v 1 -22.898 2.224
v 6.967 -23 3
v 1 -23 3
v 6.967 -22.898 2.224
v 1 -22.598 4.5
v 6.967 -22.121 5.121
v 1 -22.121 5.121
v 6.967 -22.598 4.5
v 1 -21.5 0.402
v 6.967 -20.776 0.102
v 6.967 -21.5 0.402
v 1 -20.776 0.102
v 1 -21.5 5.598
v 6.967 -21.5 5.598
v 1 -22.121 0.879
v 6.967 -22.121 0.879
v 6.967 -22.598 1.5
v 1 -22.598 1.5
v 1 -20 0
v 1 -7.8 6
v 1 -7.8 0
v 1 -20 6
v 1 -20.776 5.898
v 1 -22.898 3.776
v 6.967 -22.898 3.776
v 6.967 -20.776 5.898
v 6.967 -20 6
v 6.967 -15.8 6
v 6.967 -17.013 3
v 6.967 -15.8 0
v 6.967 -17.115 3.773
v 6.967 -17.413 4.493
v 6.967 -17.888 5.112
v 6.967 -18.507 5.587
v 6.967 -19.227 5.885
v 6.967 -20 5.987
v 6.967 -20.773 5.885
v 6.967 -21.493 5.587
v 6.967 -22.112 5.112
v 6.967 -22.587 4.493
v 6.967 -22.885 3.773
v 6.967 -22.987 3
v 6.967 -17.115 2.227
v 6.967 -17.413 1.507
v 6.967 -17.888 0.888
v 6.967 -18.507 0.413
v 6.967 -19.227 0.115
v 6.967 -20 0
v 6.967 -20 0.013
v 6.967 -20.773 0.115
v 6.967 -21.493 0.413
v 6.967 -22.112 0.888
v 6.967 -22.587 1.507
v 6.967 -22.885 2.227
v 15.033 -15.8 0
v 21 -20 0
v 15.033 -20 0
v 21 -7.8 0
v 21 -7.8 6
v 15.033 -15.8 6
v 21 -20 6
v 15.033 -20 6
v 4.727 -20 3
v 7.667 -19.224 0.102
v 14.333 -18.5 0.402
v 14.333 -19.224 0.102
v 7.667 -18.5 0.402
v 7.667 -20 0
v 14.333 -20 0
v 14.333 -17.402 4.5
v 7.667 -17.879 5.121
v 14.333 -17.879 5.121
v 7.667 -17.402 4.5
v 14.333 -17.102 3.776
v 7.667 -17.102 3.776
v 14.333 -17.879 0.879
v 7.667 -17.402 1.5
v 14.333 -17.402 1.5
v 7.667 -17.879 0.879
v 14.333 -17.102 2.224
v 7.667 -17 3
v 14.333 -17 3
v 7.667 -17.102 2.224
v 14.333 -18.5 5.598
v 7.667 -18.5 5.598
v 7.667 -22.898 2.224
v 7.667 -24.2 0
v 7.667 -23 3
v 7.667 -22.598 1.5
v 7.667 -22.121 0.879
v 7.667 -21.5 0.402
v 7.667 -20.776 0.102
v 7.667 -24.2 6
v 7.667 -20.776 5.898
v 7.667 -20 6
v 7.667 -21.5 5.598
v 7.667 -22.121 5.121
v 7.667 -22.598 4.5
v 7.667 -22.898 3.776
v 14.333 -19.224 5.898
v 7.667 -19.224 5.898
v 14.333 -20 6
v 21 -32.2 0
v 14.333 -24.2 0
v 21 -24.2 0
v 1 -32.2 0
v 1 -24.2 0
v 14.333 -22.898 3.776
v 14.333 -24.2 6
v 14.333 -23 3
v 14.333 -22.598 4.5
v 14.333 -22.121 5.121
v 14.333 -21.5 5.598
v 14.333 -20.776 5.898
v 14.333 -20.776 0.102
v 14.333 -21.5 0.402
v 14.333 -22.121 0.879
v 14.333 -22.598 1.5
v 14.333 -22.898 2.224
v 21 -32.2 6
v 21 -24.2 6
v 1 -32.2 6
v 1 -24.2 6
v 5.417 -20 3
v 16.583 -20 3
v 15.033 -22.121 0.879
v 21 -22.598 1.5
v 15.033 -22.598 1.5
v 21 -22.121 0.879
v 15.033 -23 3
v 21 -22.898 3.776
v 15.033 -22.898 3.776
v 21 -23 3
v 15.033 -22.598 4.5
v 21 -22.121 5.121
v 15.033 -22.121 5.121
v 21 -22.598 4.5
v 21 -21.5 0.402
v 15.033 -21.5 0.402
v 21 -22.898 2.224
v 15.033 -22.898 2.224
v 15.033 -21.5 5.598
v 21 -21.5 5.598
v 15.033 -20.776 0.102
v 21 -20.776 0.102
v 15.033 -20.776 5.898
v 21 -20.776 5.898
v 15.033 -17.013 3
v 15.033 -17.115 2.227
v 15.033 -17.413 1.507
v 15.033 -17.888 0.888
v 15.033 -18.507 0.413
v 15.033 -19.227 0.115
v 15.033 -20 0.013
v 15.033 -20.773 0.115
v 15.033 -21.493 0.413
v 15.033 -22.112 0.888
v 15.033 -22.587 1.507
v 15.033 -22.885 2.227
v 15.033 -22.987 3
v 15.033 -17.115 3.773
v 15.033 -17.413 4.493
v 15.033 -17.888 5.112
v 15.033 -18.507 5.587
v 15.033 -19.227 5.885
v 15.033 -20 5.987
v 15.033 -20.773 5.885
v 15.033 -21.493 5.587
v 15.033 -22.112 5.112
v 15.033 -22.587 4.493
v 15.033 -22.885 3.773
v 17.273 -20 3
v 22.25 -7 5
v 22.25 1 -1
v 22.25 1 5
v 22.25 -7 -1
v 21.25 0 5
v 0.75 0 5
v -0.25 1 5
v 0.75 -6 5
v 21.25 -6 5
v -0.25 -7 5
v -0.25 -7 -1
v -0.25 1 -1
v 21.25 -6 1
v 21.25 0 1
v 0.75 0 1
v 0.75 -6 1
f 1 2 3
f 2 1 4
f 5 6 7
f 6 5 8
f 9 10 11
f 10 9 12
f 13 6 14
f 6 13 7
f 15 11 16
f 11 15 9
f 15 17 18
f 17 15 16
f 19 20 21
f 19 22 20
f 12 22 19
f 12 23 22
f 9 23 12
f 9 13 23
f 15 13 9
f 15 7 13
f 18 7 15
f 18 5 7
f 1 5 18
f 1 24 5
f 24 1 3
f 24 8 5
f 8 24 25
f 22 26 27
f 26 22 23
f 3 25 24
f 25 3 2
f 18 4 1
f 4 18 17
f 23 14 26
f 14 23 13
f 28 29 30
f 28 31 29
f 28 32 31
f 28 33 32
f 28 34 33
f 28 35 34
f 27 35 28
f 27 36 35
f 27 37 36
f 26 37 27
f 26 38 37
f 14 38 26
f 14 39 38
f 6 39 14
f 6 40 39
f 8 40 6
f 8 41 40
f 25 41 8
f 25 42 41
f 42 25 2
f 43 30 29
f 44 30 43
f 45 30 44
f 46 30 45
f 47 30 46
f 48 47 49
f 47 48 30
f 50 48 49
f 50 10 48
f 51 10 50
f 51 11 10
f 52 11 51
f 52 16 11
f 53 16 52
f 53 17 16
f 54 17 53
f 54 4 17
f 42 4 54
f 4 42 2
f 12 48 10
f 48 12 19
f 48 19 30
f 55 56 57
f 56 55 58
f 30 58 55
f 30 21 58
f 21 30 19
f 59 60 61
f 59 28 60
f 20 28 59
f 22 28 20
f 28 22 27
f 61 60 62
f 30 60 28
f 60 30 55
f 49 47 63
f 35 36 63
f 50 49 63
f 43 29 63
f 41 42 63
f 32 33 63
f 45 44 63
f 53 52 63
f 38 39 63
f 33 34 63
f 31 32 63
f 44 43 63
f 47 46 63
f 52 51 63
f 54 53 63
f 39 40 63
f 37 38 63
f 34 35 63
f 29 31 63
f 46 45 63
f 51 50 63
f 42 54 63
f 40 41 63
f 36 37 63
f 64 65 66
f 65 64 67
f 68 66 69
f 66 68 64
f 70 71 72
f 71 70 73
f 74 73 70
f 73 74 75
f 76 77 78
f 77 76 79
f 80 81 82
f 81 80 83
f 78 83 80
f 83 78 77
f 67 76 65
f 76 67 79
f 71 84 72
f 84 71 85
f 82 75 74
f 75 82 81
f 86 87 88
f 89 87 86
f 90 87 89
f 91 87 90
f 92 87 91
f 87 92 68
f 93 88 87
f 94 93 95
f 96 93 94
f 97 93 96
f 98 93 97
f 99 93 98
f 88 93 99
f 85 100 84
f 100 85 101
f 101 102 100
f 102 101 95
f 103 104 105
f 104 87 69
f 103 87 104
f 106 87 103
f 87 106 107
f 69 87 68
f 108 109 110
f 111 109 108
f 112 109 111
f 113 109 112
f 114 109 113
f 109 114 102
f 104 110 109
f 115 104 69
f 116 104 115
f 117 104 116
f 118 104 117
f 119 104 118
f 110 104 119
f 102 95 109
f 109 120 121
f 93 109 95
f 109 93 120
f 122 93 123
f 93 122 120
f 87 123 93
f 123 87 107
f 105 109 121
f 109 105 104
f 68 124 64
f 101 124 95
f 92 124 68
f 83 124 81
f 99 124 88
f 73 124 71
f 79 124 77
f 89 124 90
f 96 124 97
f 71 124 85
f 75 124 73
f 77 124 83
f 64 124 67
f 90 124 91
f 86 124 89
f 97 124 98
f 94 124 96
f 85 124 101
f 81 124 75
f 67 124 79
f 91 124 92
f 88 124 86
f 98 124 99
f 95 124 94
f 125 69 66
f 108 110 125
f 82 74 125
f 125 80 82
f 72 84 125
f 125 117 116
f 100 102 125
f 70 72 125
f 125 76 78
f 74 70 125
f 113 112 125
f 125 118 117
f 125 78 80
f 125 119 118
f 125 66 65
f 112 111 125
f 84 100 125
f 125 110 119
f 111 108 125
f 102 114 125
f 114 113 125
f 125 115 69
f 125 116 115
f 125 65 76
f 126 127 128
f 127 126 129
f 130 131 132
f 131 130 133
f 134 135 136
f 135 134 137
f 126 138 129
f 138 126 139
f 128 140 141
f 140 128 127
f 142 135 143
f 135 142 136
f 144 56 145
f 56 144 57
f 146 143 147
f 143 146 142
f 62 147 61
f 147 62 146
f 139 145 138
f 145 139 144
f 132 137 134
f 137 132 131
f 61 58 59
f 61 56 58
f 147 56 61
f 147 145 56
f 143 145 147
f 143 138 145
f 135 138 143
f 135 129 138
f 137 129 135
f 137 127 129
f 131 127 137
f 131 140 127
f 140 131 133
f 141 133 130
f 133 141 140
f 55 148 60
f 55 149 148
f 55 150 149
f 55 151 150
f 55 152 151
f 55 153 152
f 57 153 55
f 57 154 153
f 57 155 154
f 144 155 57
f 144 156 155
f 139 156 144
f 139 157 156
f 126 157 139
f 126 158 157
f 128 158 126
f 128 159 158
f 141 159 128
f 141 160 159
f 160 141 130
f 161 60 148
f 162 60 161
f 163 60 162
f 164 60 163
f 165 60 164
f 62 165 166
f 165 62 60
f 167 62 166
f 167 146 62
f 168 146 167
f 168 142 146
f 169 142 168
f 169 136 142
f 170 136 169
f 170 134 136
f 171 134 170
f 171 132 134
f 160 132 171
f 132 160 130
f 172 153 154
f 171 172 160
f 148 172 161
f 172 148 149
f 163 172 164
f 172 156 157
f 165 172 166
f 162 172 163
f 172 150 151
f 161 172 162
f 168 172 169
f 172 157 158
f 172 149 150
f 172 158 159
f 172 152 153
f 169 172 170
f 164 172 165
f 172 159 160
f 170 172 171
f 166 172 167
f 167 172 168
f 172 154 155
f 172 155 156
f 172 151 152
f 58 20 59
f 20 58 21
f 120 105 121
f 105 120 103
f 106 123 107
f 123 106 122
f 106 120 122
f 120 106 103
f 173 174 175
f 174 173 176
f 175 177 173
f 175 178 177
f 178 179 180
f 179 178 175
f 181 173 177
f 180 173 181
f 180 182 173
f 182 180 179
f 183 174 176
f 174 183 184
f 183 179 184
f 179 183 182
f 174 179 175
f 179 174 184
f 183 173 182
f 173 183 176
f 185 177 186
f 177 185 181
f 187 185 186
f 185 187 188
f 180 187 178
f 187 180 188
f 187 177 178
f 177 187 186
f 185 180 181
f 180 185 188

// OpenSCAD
// file: mathhinge.scad
module math_hinge(){// mathgrrl cone hinge

//////////////////////////////////////////////////////
// parameters

// Length of the complete hinge
length = 20;

// Height (diameter) of the hinge
height = 3;

// Clearance between cones and holes
clearance = .7;		

// Clearance between hinge and sides
gap = .6; 				

// Parameters that the user does not get to specify
$fn=24*1;
border = 2*1; 
fudge = .01*1;			// to preserve mesh integrity
corner = 0*1;      	// space between hinge and corner
hinge_radius = height/2;
cone_height = 1.5*hinge_radius;  

//////////////////////////////////////////////////////
// renders

rotate(90,[0,1,0]) 
	translate([-hinge_radius,0,0])
		hinge();

translate([0,hinge_radius+gap,0]) bar();
translate([0,-2*border-hinge_radius-gap,0]) bar();

//translate([0,hinge_radius+gap,0]) square();
//translate([0,-length-hinge_radius-gap,0]) square();


//////////////////////////////////////////////////////
// module for hinge

module hinge(){
	rad = hinge_radius;
	clr = clearance;
	len = (length-2*corner)/3; 
	con = cone_height;
	// left outside hinge = (cylinder+box)-cone
	difference(){
		union(){
			translate([0,0,corner]) cylinder(h=len-clr,r=rad);
			translate([-rad,0,corner]) cube([2*rad,rad+gap,len-clr]);
		}
		translate([0,0,corner+len-con-clr+fudge]) cylinder(h=con,r1=0,r2=rad);
	}
	// inside hinge = cylinder+box+cone+cone
	union(){
		translate([0,0,corner+len]) cylinder(h=len,r=rad);
		translate([-rad,-rad-gap,corner+len]) cube([2*rad,rad+gap,len]);
		translate([0,0,corner+len-con]) cylinder(h=con,r1=0,r2=rad);
		translate([0,0,corner+2*len]) cylinder(h=con,r1=rad,r2=0);
	}
	// right outside hinge = (cylinder+box)-cone
	difference(){
		union(){
			translate([0,0,corner+2*len+clr]) cylinder(h=len-clr,r=rad);
			translate([-rad,0,corner+2*len+clr]) cube([2*rad,rad+gap,len-clr]);
		}
		translate([0,0,corner+2*len+clr-fudge]) cylinder(h=con,r1=rad,r2=0);	
	}
}

//////////////////////////////////////////////////////
// module for square shape

module square(){
	difference(){
		cube([length,length,height]);
		translate([border,border,-fudge])
			cube(	[length-2*border,length-2*border,height+2*fudge]);
	}
}

//////////////////////////////////////////////////////
// module for bar shape

module bar(){
	cube([length,2*border,height]);
}
}
math_hinge();
// main file
use <mathhinge.scad>;

module hinge(){
translate([1, -10, 0]) scale([1,2,2]) math_hinge();
}

module box(){
	difference(){
		cube([22.5, 8, 6], center=true);
		translate([0,0,2]) cube([20.5, 6, 6], center=true);
	}
}


translate([0, -10, 0]) hinge();
translate([11,-3,2]) box();

//for comparison
//translate([0, -5, 0]) cube([20, 4, 3]);
